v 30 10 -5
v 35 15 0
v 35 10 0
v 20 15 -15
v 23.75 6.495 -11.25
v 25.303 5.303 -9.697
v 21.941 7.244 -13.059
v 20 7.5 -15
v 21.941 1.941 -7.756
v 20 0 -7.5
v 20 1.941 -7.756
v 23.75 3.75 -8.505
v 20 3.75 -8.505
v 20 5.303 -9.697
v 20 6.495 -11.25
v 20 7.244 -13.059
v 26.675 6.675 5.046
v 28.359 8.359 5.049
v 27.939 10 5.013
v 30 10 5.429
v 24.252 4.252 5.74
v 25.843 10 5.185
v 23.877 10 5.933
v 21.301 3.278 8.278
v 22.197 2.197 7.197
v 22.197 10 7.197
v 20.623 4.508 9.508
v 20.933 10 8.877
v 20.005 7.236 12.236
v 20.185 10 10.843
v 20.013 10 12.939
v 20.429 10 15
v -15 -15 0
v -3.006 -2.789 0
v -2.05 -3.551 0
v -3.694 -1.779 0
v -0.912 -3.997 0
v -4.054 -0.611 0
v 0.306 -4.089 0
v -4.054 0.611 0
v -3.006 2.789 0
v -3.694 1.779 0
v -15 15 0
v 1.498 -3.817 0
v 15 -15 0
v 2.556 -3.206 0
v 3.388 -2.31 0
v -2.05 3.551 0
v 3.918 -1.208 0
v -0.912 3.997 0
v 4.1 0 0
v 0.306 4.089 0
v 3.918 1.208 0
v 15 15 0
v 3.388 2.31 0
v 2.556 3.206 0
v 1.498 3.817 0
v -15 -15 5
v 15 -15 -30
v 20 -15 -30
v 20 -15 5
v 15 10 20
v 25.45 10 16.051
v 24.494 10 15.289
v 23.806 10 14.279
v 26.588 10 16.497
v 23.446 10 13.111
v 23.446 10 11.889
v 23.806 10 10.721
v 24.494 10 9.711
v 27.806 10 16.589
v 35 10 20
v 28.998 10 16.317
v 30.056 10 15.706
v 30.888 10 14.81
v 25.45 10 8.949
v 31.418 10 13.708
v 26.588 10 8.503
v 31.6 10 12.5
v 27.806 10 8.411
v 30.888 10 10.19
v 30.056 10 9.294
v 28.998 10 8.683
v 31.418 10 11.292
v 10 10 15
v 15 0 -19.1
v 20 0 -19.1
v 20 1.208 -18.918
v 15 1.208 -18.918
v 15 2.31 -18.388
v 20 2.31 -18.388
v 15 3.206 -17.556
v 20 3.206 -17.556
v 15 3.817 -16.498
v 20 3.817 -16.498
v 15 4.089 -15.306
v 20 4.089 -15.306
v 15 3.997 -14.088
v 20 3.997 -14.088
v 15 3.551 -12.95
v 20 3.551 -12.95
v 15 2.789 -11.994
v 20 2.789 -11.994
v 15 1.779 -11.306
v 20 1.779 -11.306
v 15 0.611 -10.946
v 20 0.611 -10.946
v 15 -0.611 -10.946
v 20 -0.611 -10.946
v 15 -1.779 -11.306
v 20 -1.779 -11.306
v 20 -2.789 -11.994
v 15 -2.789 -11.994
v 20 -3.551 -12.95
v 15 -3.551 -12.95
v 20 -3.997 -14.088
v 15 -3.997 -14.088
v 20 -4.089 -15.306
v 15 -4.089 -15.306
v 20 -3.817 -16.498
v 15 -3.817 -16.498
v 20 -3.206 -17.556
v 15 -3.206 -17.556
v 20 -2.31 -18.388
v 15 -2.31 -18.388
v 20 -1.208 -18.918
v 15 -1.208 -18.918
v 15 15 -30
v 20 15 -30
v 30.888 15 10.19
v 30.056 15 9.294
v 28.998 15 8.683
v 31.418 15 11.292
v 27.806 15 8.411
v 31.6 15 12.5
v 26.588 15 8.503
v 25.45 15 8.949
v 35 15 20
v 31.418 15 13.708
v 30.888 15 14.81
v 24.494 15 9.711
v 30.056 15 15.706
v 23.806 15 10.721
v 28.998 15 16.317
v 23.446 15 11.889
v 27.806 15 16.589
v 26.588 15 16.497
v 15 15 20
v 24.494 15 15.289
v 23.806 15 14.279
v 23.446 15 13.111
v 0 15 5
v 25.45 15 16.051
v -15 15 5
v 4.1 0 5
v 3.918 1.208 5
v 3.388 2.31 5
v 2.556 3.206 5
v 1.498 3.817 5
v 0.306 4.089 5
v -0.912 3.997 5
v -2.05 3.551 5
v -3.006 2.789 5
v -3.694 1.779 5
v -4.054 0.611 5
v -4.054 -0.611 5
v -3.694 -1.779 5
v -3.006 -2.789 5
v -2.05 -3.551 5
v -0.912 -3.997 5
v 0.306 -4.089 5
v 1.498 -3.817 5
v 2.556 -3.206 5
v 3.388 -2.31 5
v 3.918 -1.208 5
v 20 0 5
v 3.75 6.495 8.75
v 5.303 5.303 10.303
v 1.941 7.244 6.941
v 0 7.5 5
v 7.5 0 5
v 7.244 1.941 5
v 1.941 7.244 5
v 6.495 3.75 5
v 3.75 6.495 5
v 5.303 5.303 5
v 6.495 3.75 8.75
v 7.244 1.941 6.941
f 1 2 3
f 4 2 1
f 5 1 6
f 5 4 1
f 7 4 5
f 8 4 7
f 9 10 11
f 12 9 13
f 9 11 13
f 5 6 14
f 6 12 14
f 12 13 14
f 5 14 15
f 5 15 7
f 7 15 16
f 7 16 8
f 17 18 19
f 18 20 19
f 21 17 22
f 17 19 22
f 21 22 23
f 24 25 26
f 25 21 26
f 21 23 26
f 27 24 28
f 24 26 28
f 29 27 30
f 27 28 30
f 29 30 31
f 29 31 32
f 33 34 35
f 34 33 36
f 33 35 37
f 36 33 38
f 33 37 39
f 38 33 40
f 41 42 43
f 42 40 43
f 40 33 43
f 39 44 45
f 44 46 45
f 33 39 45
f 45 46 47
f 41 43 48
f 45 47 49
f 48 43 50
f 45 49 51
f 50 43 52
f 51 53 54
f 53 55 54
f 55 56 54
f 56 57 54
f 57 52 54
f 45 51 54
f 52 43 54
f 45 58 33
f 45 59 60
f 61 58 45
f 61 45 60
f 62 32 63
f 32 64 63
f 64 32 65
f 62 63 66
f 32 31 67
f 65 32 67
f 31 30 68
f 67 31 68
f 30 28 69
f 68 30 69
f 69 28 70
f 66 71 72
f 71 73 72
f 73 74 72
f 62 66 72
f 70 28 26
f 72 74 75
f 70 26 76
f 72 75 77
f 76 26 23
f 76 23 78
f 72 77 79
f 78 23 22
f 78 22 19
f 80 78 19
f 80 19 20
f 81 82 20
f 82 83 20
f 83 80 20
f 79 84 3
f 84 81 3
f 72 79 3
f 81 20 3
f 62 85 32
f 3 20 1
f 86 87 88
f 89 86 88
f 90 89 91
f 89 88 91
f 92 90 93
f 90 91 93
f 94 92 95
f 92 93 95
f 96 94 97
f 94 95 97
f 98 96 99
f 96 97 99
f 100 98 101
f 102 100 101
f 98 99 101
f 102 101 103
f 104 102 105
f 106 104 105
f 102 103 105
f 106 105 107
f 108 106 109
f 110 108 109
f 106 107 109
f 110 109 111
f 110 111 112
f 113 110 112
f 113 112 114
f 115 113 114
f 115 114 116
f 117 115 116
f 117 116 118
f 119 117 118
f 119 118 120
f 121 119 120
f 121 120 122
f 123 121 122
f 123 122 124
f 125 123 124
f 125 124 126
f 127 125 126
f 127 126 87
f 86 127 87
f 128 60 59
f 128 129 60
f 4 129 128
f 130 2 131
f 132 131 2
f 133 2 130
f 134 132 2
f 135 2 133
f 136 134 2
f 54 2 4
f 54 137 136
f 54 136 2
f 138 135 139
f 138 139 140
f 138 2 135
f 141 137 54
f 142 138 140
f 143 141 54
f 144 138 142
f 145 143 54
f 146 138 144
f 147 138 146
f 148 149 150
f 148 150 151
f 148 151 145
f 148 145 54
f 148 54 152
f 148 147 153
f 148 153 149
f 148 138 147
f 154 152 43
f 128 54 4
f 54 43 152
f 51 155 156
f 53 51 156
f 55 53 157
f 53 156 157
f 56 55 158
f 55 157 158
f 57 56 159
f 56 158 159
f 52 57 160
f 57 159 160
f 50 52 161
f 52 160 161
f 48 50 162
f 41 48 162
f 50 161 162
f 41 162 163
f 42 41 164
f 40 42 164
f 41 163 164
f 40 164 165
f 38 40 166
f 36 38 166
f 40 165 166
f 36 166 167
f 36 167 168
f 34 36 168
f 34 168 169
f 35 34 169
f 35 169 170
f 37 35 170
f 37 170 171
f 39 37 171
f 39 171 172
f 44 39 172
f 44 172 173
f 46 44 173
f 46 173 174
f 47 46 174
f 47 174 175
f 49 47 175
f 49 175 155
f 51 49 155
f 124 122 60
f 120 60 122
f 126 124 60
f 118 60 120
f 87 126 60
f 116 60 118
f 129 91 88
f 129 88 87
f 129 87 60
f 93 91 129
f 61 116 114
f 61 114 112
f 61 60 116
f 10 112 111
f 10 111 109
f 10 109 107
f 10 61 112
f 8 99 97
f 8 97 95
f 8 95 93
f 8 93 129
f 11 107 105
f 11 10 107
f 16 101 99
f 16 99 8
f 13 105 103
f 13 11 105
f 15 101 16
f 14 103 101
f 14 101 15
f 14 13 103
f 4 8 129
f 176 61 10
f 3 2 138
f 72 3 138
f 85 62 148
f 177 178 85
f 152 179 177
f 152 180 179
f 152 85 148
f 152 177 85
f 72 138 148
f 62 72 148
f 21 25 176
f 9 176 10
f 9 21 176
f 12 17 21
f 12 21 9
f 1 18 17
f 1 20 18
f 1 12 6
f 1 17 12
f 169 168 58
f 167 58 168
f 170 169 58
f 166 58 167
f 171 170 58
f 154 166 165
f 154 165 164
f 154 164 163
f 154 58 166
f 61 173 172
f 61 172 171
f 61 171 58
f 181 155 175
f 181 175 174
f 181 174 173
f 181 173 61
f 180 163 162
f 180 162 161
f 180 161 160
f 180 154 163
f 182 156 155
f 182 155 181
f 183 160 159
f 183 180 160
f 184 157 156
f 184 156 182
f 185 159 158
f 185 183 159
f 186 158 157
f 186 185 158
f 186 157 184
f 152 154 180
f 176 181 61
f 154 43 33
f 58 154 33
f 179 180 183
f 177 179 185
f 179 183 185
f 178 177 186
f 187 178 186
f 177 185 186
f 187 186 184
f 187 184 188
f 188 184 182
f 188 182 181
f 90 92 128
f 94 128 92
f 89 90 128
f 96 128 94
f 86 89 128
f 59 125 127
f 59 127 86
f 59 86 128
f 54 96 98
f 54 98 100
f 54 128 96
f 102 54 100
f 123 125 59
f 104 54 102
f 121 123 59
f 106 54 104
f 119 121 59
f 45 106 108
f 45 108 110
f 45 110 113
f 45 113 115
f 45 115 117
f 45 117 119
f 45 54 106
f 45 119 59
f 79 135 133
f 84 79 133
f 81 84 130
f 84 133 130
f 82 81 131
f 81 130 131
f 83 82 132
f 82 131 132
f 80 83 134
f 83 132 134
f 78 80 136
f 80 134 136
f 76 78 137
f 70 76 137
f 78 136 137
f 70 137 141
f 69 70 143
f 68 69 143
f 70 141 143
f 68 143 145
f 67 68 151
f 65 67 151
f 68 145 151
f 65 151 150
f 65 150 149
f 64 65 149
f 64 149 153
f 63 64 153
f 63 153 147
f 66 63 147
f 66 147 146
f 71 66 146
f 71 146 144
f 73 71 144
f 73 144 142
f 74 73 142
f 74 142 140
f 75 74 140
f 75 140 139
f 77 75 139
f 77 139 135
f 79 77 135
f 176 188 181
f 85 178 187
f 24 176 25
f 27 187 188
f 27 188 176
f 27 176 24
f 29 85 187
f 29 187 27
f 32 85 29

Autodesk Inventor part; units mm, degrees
ref_plane "YZ Plane" through (0, 0, 0) normal (1, 0, 0) x (0, 1, 0)
ref_plane "XZ Plane" through (0, 0, 0) normal (0, 1, 0) x (-1, 0, 0)
ref_plane "XY Plane" through (0, 0, 0) normal (0, 0, 1) x (1, 0, 0)
sketch "Эскиз1" plane through (0, 0, 0) normal (0, 0, 1) x (1, 0, 0)
  line L0 (-15, -15) -> (15, -15)
  line L1 (15, -15) -> (15, 15)
  line L2 (15, 15) -> (-15, 15)
  line L3 (-15, 15) -> (-15, -15)
  line L4 (-15, -15) -> (15, 15) construction
  line L5 (15, -15) -> (-15, 15) construction
  line L6 (15, 15) -> (20, 15)
  line L7 (20, 15) -> (20, -15)
  line L8 (20, -15) -> (15, -15)
  line L9 (15, -15) -> (15, 15)
  point P0 (0, 0)
  dimension "d0" = 30
  dimension "d1" = 30
  dimension "d2" = 5
extrude "Выдавливание1" add sketch "Эскиз1" along normal blind 5
sketch "Эскиз2" plane through (0, 0, 0) normal (0, 0, -1) x (-1, 0, 0)
  line L0 (-20, -15) -> (-20, 15) projected
  line L1 (15, -15) -> (-20, -15) projected
  line L2 (-20, 15) -> (-15, 15)
  line L3 (-15, 15) -> (-15, -15)
  line L4 (-15, -15) -> (-20, -15)
  line L5 (-20, -15) -> (-20, 15)
  point P0 (0, 0)
  dimension "d7" = 5
extrude "Выдавливание2" add sketch "Эскиз2" along normal blind 30
sketch "Эскиз3" plane through (0, 0, 5) normal (0, 0, 1) x (1, 0, 0)
  line L0 (-15, 15) -> (-15, -15) projected
  line L1 (-15, 0) -> (0, 0)
  circle A0 centre (0, 0) radius 4.1
  dimension "d10" = 15
  dimension "d11" = 8.2
sketch "Эскиз4" plane through (20, -15, 5) normal (1, 0, 0) x (0, 0, -1)
  line L0 (35, 30) -> (35, 0) projected
  line L1 (35, 15) -> (20, 15)
  circle A0 centre (20, 15) radius 4.1
  point P0 (5, 15)
  dimension "d12" = 15
  dimension "d13" = 8.2
sketch "Эскиз5" plane through (-15, 15, 5) normal (0, 1, 0) x (1, 0, 0)
  line L0 (30, 5) -> (30, 35) projected
  line L1 (30, 5) -> (50, 5)
  line L2 (50, 5) -> (50, -15)
  line L3 (50, -15) -> (30, -15)
  line L4 (30, -15) -> (30, 5)
  point P0 (15, 5)
  dimension "d18" = 20
  dimension "d19" = 20
extrude "Выдавливание5" add sketch "Эскиз5" against normal blind 5
chamfer "Фаска1" distance 15 angle 45 2 edges at (20, 12.5, 0) (15, 12.5, 5)
chamfer "Фаска2" distance 10 angle 45 2 edges at (17.5, 10, 5) (20, 10, 2.5)
extrude "Выдавливание6" cut sketch "Эскиз3" along normal blind 5 and the other way blind 16.25
extrude "Выдавливание7" cut sketch "Эскиз4" along normal blind 5 and the other way blind 11.5
sketch "Эскиз6" plane through (0, 0, 5) normal (0, 0, 1) x (1, 0, 0)
  circle A0 centre (0, 0) radius 7.5
  dimension "d38" = 15
extrude "Выдавливание8" cut sketch "Эскиз6" along normal blind 10.5
sketch "Эскиз7" plane through (20, -15, -30) normal (1, 0, 0) x (0, 0, -1)
  arc A0 (-19.1, 15) -> (-15, 19.1) centre (-15, 15) ccw projected
  circle A1 centre (-15, 15) radius 7.5
  point P0 (-30, 15)
  point P1 (-15, 10.9)
  dimension "d41" = 15
extrude "Выдавливание9" cut sketch "Эскиз7" along normal blind 10.5
sketch "Эскиз8" plane through (-15, 15, 5) normal (0, 1, 0) x (1, 0, 0)
  line L0 (35, 0) -> (45, -10) projected
  circle A0 centre (42.5, -7.5) radius 4.1
  point P0 (15, 5)
  point P1 (50, -15)
  dimension "d44" = 8.2
extrude "Выдавливание10" cut sketch "Эскиз8" against normal blind 17.25
sketch "Эскиз9" plane through (-15, 10, 5) normal (0, -1, 0) x (1, 0, 0)
  arc A0 (39.2504, 10) -> (39.6009, 4.6009) centre (42.5, 7.5) ccw projected
  circle A1 centre (42.5, 7.5) radius 7.5
  point P0 (15, -5)
  dimension "d47" = 15
extrude "Выдавливание11" cut sketch "Эскиз9" along normal blind 24
properties part number "КВ33.044.003 - крепеж дна блока управления" material "Пластик АБС"
